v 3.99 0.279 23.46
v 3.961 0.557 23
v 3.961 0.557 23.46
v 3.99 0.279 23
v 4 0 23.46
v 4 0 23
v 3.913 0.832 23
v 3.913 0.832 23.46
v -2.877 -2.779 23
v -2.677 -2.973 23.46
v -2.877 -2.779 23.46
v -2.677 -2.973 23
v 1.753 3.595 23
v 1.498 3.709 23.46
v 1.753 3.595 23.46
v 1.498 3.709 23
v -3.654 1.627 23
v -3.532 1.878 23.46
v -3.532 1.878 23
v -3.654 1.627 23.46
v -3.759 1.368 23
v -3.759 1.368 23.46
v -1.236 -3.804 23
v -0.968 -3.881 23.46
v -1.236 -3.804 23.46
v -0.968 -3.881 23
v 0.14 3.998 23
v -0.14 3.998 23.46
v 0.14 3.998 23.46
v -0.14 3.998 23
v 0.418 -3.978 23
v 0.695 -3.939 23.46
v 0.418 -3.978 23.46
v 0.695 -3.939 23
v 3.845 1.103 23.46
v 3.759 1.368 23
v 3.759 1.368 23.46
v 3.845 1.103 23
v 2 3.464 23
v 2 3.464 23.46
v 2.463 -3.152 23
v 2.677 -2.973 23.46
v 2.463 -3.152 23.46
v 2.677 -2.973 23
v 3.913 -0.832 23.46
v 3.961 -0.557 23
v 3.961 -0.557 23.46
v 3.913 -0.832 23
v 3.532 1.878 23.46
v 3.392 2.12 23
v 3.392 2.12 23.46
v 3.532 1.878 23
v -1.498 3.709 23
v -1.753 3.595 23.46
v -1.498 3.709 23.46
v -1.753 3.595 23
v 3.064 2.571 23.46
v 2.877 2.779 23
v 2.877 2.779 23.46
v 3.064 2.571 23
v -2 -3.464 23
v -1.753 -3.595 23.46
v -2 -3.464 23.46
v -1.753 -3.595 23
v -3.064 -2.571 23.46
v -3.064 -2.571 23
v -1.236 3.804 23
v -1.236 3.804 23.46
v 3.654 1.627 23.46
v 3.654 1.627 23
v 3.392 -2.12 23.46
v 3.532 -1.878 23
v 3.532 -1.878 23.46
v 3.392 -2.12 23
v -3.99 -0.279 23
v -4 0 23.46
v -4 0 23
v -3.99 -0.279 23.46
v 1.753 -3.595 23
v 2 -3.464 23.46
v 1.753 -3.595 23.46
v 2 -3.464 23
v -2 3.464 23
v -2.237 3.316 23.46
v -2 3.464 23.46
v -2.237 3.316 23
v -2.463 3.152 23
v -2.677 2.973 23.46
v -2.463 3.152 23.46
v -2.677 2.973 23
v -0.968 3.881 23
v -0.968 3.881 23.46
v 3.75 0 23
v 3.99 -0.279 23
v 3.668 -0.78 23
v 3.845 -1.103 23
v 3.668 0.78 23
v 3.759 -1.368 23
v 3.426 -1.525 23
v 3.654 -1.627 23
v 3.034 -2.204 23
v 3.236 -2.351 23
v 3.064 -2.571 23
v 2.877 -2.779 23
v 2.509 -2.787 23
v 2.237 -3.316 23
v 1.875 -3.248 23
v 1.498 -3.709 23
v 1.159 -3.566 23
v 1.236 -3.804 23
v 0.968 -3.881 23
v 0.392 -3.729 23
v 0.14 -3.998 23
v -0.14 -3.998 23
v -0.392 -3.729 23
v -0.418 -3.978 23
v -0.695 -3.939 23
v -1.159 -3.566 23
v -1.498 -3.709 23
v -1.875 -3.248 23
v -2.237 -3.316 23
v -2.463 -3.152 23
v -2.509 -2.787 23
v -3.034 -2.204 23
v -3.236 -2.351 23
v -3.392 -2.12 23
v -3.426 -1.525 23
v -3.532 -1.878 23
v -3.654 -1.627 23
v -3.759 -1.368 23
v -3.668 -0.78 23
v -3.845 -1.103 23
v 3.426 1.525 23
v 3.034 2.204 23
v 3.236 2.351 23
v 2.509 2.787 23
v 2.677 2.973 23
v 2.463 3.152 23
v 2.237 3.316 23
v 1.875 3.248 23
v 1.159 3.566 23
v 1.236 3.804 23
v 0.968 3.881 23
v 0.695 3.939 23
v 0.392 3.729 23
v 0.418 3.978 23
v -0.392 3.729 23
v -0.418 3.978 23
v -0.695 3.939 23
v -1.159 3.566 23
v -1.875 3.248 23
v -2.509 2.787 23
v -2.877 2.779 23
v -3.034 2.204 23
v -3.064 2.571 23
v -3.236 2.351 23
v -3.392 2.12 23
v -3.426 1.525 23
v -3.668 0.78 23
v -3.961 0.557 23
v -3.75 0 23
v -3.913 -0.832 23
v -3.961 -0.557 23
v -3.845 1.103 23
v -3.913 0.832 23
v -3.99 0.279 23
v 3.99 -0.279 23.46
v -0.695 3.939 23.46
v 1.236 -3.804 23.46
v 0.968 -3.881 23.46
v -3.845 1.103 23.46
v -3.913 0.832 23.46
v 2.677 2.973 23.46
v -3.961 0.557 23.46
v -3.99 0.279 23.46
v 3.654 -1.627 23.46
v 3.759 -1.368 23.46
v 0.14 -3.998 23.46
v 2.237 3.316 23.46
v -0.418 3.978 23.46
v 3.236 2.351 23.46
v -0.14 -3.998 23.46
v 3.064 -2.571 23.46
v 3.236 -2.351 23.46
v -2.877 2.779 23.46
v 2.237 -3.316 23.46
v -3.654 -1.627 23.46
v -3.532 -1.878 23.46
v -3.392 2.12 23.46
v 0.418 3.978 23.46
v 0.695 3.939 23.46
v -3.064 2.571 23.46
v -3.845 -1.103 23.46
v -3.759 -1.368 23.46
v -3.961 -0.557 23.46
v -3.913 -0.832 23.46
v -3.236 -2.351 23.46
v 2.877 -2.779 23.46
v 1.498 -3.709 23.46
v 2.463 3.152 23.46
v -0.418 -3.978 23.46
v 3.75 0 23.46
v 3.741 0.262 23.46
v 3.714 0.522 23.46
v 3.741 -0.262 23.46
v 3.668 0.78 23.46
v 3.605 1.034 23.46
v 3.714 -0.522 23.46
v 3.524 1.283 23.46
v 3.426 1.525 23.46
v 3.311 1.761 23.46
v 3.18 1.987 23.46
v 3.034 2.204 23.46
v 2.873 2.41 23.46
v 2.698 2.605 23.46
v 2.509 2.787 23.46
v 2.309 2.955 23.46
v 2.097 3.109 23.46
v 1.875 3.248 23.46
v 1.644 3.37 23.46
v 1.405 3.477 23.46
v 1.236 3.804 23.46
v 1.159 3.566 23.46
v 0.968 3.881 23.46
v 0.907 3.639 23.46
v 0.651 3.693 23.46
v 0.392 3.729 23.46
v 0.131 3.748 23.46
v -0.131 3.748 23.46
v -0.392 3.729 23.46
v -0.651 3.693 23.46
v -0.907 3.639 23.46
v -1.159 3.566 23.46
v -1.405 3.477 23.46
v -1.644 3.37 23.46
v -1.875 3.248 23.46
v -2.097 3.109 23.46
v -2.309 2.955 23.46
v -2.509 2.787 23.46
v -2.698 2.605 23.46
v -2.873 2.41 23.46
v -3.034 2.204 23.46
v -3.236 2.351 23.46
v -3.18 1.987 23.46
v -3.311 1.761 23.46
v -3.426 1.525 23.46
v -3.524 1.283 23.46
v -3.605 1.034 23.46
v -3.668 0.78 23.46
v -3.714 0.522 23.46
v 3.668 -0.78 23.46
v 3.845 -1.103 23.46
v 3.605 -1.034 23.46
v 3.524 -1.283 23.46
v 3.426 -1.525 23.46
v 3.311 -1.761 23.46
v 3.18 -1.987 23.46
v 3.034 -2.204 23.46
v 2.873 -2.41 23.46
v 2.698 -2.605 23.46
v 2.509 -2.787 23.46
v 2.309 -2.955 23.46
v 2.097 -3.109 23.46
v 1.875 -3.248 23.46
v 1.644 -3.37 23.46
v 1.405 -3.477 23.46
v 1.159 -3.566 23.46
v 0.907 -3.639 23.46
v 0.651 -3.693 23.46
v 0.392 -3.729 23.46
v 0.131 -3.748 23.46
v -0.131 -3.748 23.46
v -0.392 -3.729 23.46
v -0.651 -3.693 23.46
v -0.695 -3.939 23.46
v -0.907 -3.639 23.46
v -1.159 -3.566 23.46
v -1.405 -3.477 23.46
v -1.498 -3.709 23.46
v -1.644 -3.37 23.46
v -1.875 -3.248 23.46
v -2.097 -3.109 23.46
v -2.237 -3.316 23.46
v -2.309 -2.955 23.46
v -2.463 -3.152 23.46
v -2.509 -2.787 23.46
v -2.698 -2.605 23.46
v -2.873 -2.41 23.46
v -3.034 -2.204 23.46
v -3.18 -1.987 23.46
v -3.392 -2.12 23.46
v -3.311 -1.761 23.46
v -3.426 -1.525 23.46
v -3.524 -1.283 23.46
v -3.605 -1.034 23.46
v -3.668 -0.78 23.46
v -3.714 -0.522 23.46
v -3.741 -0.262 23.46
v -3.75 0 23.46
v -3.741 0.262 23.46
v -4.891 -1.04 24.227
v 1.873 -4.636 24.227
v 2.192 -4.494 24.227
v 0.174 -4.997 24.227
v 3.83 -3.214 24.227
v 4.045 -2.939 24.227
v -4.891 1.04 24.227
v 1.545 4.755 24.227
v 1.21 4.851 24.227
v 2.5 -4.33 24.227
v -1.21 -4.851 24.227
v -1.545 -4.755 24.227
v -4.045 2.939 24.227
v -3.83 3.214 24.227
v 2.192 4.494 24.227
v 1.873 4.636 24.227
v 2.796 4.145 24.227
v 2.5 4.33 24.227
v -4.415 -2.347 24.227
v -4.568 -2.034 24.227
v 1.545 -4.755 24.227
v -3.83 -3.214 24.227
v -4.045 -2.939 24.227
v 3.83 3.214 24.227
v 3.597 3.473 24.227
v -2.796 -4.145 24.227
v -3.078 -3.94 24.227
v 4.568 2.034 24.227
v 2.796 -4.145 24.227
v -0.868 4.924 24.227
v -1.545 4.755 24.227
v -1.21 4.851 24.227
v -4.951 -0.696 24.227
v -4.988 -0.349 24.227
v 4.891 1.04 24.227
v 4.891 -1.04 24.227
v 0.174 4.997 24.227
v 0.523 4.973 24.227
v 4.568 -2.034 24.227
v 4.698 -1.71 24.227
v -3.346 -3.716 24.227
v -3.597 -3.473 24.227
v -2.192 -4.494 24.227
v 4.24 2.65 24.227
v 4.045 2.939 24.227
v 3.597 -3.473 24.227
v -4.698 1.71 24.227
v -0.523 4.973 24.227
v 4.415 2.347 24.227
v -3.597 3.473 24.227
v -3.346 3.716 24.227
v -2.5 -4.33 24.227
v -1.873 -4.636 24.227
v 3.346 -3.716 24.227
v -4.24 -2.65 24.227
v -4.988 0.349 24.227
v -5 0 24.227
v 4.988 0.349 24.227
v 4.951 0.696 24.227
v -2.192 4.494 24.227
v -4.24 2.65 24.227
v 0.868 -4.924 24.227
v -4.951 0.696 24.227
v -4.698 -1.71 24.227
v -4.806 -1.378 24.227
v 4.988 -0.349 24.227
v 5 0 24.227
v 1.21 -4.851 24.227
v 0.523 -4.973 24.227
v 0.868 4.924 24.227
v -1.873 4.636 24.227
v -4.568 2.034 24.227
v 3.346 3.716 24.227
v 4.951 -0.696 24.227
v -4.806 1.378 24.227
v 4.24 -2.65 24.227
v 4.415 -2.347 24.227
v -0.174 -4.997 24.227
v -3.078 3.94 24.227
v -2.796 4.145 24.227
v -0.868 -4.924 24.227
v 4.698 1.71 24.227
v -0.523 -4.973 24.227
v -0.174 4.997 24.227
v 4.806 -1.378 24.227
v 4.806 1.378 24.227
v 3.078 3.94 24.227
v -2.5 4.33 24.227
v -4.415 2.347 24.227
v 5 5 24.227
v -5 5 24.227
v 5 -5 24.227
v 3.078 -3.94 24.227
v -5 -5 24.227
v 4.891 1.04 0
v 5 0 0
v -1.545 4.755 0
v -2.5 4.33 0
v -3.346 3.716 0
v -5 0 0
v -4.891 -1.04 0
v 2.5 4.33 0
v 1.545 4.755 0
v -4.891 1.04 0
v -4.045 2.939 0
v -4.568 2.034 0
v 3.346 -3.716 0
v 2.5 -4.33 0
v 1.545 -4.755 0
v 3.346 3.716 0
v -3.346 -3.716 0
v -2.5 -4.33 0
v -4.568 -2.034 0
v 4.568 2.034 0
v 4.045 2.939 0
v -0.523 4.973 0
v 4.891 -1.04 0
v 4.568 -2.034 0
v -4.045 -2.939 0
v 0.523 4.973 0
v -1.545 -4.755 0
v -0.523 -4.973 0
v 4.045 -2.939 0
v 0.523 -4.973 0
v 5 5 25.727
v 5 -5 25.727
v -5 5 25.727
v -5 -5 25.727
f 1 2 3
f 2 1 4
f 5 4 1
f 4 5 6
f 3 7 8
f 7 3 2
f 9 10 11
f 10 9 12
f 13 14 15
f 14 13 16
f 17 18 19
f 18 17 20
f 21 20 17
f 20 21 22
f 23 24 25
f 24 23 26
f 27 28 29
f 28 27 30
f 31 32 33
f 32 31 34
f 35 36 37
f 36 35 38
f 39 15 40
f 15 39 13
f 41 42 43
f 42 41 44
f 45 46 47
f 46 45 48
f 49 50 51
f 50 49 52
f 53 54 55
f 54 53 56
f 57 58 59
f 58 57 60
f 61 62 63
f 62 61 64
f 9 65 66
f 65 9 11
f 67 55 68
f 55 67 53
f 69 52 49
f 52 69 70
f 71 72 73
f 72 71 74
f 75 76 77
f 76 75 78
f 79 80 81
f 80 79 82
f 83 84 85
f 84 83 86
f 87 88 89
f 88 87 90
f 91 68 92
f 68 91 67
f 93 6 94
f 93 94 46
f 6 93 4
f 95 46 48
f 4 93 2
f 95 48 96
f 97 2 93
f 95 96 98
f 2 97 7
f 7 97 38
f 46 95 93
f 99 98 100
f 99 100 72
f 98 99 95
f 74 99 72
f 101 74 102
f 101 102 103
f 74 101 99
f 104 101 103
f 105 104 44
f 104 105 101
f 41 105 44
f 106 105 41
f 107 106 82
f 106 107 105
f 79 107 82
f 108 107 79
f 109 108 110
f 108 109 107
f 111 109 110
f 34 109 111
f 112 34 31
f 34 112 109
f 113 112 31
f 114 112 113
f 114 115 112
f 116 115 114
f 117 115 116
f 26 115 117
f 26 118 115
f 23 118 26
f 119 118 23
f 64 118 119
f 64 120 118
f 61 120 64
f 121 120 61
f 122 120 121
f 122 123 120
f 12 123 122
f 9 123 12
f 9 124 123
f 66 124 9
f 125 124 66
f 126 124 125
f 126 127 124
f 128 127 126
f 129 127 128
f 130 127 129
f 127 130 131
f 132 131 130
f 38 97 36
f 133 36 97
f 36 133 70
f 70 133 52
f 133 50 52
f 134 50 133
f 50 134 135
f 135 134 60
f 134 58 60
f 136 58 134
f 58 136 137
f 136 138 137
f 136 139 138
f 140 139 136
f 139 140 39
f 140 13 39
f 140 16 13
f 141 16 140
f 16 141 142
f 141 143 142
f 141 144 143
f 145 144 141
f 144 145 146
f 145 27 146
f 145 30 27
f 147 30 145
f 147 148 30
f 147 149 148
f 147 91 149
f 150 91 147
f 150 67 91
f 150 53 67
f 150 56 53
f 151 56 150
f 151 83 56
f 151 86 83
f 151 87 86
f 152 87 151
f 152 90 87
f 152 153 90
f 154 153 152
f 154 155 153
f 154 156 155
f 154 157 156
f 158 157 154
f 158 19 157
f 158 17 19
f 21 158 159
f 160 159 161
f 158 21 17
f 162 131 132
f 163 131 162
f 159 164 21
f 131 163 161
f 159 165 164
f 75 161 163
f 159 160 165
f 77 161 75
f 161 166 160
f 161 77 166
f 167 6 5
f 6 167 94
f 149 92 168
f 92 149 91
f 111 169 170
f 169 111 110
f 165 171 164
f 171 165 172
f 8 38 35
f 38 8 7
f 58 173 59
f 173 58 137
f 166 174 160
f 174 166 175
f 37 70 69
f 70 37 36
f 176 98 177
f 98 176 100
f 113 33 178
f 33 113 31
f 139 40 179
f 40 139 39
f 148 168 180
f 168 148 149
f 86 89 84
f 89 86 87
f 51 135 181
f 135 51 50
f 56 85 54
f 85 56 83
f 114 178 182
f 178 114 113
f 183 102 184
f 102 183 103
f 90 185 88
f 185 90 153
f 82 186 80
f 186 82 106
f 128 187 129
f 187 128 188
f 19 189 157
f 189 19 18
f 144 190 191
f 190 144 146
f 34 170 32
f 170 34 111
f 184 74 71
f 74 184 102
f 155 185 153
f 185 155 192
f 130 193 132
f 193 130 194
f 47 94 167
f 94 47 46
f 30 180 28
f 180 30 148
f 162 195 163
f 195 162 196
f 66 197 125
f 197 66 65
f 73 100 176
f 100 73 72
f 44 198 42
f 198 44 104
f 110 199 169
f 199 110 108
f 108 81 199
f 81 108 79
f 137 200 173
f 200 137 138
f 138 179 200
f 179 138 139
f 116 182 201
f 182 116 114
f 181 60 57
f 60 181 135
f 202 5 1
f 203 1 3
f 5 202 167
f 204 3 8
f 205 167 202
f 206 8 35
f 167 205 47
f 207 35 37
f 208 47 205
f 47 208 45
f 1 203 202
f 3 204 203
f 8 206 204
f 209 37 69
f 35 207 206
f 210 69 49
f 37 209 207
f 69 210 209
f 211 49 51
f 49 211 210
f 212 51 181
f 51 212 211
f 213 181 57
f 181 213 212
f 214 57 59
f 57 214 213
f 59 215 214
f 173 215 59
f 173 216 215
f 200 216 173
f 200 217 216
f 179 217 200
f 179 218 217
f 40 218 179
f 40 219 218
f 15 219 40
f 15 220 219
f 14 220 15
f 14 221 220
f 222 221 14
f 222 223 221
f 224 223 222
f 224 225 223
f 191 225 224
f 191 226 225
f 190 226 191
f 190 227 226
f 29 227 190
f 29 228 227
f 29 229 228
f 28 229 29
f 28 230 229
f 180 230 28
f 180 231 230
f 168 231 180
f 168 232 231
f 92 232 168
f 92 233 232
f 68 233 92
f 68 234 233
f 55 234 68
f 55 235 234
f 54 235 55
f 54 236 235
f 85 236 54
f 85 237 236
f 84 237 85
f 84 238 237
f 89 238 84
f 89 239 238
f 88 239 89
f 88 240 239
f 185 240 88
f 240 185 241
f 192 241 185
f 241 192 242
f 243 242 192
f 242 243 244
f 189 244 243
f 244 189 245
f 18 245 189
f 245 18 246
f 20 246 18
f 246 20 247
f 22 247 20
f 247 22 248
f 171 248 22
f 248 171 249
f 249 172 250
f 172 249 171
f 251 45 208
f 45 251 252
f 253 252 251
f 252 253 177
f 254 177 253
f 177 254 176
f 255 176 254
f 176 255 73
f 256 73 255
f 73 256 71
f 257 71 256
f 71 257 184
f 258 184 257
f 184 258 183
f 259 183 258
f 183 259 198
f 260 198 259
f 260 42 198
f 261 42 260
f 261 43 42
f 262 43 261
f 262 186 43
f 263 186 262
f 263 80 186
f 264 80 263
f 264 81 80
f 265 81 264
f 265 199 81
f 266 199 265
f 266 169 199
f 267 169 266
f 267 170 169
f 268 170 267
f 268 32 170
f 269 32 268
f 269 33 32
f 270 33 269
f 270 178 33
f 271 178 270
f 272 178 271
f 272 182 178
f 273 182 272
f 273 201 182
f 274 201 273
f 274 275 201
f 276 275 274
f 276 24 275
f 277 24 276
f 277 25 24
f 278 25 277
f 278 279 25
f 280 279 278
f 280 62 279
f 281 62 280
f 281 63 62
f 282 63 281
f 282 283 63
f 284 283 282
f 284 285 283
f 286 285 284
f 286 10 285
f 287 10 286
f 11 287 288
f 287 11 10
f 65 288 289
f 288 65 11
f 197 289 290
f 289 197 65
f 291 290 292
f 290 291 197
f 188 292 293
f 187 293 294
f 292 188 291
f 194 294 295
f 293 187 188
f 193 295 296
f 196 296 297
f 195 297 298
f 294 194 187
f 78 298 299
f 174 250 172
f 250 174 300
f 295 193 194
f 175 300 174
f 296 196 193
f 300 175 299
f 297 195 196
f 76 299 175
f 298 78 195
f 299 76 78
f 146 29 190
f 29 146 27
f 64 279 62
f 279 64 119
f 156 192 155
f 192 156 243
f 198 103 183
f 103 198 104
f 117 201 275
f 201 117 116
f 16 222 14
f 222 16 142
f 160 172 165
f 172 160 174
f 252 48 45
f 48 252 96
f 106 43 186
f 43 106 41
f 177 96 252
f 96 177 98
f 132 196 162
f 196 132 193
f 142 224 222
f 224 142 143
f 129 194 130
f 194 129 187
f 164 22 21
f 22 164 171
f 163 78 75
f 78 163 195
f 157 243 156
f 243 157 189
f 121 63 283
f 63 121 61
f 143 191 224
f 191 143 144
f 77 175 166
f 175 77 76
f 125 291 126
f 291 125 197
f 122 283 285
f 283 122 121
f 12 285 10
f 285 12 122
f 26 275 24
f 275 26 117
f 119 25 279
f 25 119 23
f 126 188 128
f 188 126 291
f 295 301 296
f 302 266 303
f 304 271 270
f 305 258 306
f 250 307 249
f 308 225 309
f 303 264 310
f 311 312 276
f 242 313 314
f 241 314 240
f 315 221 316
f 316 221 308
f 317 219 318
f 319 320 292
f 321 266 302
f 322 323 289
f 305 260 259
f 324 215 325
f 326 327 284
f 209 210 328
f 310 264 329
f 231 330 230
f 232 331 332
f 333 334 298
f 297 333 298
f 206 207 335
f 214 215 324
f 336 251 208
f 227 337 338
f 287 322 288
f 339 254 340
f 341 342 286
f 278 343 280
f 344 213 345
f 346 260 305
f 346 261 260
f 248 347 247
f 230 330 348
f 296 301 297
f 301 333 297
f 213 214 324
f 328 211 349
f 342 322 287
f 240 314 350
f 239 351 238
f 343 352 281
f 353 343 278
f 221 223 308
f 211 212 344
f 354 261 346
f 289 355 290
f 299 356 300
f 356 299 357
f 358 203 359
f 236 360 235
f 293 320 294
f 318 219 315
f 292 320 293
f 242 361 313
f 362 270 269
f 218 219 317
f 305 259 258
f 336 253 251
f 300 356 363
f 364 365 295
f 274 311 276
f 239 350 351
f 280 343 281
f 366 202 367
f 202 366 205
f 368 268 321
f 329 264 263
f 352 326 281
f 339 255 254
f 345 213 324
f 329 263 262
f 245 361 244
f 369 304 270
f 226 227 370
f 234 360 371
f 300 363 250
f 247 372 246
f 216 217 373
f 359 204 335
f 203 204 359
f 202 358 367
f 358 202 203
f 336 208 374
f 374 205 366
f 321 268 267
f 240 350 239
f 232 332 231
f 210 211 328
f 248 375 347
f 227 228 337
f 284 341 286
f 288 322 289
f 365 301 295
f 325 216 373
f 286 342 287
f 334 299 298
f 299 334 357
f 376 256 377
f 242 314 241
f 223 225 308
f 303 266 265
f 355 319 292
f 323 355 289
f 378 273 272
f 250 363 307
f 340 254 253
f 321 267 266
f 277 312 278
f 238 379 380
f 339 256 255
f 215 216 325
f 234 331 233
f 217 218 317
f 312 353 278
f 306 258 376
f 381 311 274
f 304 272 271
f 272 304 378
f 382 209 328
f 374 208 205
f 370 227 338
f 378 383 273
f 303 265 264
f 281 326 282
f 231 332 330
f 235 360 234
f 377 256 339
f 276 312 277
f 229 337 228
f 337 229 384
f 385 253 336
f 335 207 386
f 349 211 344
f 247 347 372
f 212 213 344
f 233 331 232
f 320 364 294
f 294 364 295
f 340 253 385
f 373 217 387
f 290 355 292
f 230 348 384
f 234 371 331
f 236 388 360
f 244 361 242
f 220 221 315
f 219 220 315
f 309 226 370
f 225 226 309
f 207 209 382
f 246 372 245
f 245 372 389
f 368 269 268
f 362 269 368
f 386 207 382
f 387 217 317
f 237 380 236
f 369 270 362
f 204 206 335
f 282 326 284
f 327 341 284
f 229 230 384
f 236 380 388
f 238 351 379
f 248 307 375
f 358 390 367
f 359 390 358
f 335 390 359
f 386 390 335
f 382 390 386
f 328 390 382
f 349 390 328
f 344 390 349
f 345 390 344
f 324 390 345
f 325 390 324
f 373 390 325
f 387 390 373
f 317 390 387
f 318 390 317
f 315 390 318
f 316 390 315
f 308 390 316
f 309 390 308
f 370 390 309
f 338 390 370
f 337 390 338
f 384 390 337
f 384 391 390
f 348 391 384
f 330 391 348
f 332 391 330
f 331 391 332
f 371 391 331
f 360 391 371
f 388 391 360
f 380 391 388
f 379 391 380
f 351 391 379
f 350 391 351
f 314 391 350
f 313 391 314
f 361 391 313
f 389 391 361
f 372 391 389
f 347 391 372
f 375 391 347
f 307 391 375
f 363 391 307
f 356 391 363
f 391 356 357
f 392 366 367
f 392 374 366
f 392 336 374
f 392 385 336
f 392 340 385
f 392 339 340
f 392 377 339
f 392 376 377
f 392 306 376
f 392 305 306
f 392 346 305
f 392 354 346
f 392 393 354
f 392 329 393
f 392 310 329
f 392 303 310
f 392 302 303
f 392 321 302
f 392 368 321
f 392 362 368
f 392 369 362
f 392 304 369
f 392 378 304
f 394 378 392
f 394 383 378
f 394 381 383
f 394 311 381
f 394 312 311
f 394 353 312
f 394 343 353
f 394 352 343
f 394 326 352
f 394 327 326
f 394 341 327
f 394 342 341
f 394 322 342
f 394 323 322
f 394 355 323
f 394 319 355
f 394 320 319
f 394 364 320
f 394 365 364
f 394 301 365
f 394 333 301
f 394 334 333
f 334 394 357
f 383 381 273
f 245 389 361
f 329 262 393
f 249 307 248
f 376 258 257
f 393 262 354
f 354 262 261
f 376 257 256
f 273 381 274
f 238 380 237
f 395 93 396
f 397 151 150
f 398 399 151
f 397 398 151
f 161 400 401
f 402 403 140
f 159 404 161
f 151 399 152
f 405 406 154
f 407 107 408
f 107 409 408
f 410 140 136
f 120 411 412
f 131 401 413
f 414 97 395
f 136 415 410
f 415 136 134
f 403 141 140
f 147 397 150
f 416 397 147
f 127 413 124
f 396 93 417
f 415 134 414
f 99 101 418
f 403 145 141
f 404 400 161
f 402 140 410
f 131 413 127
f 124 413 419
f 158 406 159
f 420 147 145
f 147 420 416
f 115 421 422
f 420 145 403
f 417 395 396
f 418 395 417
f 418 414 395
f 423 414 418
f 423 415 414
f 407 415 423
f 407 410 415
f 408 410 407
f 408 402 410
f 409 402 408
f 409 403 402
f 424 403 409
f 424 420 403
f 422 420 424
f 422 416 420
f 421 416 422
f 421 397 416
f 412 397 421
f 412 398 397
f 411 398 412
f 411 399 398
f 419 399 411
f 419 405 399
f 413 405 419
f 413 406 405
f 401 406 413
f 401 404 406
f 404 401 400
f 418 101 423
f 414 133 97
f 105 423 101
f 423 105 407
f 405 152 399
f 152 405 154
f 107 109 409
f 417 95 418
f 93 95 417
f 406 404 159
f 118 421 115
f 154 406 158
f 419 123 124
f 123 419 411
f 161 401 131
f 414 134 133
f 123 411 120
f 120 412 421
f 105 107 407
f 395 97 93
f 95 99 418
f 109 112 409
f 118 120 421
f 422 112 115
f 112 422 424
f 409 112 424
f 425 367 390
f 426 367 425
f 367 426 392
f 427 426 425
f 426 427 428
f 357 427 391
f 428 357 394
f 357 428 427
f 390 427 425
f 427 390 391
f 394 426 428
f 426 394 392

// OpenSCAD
module stackCylinder(vector, i = 0) {
    if (i < len(vector)) {
        cylinder(h=vector[i][0], d1=vector[i][1], d2=vector[i][2], $fn=vector[i][3]);
        translate([0,0,vector[i][0]]) stackCylinder(vector, i+1);
    }
}


height = 23;
bottomDiameter = 10;
column(height, bottomDiameter);

// ********* Column Module ***********
module column(height, bottomDiameter) {
numFacets = 30;
topDiameter = bottomDiameter * 3/4;
hSmallCyl1 = height/50;
hSmallCyl2 = height/30;

stackCylinder([
    [height, bottomDiameter, topDiameter, numFacets],
    [hSmallCyl1, topDiameter + 0.5, topDiameter + 0.5, numFacets*3],
    [hSmallCyl2, topDiameter, bottomDiameter, numFacets*3]
]);

// flat cube on top
x = bottomDiameter;
y = x;
z = 1.5;
centeringCube = -x/2;
translate([centeringCube, centeringCube, height + hSmallCyl1 + hSmallCyl2]) 
{
    cube(size = [x,y,z]);
};
}
// ********* End of Column Module ***********
